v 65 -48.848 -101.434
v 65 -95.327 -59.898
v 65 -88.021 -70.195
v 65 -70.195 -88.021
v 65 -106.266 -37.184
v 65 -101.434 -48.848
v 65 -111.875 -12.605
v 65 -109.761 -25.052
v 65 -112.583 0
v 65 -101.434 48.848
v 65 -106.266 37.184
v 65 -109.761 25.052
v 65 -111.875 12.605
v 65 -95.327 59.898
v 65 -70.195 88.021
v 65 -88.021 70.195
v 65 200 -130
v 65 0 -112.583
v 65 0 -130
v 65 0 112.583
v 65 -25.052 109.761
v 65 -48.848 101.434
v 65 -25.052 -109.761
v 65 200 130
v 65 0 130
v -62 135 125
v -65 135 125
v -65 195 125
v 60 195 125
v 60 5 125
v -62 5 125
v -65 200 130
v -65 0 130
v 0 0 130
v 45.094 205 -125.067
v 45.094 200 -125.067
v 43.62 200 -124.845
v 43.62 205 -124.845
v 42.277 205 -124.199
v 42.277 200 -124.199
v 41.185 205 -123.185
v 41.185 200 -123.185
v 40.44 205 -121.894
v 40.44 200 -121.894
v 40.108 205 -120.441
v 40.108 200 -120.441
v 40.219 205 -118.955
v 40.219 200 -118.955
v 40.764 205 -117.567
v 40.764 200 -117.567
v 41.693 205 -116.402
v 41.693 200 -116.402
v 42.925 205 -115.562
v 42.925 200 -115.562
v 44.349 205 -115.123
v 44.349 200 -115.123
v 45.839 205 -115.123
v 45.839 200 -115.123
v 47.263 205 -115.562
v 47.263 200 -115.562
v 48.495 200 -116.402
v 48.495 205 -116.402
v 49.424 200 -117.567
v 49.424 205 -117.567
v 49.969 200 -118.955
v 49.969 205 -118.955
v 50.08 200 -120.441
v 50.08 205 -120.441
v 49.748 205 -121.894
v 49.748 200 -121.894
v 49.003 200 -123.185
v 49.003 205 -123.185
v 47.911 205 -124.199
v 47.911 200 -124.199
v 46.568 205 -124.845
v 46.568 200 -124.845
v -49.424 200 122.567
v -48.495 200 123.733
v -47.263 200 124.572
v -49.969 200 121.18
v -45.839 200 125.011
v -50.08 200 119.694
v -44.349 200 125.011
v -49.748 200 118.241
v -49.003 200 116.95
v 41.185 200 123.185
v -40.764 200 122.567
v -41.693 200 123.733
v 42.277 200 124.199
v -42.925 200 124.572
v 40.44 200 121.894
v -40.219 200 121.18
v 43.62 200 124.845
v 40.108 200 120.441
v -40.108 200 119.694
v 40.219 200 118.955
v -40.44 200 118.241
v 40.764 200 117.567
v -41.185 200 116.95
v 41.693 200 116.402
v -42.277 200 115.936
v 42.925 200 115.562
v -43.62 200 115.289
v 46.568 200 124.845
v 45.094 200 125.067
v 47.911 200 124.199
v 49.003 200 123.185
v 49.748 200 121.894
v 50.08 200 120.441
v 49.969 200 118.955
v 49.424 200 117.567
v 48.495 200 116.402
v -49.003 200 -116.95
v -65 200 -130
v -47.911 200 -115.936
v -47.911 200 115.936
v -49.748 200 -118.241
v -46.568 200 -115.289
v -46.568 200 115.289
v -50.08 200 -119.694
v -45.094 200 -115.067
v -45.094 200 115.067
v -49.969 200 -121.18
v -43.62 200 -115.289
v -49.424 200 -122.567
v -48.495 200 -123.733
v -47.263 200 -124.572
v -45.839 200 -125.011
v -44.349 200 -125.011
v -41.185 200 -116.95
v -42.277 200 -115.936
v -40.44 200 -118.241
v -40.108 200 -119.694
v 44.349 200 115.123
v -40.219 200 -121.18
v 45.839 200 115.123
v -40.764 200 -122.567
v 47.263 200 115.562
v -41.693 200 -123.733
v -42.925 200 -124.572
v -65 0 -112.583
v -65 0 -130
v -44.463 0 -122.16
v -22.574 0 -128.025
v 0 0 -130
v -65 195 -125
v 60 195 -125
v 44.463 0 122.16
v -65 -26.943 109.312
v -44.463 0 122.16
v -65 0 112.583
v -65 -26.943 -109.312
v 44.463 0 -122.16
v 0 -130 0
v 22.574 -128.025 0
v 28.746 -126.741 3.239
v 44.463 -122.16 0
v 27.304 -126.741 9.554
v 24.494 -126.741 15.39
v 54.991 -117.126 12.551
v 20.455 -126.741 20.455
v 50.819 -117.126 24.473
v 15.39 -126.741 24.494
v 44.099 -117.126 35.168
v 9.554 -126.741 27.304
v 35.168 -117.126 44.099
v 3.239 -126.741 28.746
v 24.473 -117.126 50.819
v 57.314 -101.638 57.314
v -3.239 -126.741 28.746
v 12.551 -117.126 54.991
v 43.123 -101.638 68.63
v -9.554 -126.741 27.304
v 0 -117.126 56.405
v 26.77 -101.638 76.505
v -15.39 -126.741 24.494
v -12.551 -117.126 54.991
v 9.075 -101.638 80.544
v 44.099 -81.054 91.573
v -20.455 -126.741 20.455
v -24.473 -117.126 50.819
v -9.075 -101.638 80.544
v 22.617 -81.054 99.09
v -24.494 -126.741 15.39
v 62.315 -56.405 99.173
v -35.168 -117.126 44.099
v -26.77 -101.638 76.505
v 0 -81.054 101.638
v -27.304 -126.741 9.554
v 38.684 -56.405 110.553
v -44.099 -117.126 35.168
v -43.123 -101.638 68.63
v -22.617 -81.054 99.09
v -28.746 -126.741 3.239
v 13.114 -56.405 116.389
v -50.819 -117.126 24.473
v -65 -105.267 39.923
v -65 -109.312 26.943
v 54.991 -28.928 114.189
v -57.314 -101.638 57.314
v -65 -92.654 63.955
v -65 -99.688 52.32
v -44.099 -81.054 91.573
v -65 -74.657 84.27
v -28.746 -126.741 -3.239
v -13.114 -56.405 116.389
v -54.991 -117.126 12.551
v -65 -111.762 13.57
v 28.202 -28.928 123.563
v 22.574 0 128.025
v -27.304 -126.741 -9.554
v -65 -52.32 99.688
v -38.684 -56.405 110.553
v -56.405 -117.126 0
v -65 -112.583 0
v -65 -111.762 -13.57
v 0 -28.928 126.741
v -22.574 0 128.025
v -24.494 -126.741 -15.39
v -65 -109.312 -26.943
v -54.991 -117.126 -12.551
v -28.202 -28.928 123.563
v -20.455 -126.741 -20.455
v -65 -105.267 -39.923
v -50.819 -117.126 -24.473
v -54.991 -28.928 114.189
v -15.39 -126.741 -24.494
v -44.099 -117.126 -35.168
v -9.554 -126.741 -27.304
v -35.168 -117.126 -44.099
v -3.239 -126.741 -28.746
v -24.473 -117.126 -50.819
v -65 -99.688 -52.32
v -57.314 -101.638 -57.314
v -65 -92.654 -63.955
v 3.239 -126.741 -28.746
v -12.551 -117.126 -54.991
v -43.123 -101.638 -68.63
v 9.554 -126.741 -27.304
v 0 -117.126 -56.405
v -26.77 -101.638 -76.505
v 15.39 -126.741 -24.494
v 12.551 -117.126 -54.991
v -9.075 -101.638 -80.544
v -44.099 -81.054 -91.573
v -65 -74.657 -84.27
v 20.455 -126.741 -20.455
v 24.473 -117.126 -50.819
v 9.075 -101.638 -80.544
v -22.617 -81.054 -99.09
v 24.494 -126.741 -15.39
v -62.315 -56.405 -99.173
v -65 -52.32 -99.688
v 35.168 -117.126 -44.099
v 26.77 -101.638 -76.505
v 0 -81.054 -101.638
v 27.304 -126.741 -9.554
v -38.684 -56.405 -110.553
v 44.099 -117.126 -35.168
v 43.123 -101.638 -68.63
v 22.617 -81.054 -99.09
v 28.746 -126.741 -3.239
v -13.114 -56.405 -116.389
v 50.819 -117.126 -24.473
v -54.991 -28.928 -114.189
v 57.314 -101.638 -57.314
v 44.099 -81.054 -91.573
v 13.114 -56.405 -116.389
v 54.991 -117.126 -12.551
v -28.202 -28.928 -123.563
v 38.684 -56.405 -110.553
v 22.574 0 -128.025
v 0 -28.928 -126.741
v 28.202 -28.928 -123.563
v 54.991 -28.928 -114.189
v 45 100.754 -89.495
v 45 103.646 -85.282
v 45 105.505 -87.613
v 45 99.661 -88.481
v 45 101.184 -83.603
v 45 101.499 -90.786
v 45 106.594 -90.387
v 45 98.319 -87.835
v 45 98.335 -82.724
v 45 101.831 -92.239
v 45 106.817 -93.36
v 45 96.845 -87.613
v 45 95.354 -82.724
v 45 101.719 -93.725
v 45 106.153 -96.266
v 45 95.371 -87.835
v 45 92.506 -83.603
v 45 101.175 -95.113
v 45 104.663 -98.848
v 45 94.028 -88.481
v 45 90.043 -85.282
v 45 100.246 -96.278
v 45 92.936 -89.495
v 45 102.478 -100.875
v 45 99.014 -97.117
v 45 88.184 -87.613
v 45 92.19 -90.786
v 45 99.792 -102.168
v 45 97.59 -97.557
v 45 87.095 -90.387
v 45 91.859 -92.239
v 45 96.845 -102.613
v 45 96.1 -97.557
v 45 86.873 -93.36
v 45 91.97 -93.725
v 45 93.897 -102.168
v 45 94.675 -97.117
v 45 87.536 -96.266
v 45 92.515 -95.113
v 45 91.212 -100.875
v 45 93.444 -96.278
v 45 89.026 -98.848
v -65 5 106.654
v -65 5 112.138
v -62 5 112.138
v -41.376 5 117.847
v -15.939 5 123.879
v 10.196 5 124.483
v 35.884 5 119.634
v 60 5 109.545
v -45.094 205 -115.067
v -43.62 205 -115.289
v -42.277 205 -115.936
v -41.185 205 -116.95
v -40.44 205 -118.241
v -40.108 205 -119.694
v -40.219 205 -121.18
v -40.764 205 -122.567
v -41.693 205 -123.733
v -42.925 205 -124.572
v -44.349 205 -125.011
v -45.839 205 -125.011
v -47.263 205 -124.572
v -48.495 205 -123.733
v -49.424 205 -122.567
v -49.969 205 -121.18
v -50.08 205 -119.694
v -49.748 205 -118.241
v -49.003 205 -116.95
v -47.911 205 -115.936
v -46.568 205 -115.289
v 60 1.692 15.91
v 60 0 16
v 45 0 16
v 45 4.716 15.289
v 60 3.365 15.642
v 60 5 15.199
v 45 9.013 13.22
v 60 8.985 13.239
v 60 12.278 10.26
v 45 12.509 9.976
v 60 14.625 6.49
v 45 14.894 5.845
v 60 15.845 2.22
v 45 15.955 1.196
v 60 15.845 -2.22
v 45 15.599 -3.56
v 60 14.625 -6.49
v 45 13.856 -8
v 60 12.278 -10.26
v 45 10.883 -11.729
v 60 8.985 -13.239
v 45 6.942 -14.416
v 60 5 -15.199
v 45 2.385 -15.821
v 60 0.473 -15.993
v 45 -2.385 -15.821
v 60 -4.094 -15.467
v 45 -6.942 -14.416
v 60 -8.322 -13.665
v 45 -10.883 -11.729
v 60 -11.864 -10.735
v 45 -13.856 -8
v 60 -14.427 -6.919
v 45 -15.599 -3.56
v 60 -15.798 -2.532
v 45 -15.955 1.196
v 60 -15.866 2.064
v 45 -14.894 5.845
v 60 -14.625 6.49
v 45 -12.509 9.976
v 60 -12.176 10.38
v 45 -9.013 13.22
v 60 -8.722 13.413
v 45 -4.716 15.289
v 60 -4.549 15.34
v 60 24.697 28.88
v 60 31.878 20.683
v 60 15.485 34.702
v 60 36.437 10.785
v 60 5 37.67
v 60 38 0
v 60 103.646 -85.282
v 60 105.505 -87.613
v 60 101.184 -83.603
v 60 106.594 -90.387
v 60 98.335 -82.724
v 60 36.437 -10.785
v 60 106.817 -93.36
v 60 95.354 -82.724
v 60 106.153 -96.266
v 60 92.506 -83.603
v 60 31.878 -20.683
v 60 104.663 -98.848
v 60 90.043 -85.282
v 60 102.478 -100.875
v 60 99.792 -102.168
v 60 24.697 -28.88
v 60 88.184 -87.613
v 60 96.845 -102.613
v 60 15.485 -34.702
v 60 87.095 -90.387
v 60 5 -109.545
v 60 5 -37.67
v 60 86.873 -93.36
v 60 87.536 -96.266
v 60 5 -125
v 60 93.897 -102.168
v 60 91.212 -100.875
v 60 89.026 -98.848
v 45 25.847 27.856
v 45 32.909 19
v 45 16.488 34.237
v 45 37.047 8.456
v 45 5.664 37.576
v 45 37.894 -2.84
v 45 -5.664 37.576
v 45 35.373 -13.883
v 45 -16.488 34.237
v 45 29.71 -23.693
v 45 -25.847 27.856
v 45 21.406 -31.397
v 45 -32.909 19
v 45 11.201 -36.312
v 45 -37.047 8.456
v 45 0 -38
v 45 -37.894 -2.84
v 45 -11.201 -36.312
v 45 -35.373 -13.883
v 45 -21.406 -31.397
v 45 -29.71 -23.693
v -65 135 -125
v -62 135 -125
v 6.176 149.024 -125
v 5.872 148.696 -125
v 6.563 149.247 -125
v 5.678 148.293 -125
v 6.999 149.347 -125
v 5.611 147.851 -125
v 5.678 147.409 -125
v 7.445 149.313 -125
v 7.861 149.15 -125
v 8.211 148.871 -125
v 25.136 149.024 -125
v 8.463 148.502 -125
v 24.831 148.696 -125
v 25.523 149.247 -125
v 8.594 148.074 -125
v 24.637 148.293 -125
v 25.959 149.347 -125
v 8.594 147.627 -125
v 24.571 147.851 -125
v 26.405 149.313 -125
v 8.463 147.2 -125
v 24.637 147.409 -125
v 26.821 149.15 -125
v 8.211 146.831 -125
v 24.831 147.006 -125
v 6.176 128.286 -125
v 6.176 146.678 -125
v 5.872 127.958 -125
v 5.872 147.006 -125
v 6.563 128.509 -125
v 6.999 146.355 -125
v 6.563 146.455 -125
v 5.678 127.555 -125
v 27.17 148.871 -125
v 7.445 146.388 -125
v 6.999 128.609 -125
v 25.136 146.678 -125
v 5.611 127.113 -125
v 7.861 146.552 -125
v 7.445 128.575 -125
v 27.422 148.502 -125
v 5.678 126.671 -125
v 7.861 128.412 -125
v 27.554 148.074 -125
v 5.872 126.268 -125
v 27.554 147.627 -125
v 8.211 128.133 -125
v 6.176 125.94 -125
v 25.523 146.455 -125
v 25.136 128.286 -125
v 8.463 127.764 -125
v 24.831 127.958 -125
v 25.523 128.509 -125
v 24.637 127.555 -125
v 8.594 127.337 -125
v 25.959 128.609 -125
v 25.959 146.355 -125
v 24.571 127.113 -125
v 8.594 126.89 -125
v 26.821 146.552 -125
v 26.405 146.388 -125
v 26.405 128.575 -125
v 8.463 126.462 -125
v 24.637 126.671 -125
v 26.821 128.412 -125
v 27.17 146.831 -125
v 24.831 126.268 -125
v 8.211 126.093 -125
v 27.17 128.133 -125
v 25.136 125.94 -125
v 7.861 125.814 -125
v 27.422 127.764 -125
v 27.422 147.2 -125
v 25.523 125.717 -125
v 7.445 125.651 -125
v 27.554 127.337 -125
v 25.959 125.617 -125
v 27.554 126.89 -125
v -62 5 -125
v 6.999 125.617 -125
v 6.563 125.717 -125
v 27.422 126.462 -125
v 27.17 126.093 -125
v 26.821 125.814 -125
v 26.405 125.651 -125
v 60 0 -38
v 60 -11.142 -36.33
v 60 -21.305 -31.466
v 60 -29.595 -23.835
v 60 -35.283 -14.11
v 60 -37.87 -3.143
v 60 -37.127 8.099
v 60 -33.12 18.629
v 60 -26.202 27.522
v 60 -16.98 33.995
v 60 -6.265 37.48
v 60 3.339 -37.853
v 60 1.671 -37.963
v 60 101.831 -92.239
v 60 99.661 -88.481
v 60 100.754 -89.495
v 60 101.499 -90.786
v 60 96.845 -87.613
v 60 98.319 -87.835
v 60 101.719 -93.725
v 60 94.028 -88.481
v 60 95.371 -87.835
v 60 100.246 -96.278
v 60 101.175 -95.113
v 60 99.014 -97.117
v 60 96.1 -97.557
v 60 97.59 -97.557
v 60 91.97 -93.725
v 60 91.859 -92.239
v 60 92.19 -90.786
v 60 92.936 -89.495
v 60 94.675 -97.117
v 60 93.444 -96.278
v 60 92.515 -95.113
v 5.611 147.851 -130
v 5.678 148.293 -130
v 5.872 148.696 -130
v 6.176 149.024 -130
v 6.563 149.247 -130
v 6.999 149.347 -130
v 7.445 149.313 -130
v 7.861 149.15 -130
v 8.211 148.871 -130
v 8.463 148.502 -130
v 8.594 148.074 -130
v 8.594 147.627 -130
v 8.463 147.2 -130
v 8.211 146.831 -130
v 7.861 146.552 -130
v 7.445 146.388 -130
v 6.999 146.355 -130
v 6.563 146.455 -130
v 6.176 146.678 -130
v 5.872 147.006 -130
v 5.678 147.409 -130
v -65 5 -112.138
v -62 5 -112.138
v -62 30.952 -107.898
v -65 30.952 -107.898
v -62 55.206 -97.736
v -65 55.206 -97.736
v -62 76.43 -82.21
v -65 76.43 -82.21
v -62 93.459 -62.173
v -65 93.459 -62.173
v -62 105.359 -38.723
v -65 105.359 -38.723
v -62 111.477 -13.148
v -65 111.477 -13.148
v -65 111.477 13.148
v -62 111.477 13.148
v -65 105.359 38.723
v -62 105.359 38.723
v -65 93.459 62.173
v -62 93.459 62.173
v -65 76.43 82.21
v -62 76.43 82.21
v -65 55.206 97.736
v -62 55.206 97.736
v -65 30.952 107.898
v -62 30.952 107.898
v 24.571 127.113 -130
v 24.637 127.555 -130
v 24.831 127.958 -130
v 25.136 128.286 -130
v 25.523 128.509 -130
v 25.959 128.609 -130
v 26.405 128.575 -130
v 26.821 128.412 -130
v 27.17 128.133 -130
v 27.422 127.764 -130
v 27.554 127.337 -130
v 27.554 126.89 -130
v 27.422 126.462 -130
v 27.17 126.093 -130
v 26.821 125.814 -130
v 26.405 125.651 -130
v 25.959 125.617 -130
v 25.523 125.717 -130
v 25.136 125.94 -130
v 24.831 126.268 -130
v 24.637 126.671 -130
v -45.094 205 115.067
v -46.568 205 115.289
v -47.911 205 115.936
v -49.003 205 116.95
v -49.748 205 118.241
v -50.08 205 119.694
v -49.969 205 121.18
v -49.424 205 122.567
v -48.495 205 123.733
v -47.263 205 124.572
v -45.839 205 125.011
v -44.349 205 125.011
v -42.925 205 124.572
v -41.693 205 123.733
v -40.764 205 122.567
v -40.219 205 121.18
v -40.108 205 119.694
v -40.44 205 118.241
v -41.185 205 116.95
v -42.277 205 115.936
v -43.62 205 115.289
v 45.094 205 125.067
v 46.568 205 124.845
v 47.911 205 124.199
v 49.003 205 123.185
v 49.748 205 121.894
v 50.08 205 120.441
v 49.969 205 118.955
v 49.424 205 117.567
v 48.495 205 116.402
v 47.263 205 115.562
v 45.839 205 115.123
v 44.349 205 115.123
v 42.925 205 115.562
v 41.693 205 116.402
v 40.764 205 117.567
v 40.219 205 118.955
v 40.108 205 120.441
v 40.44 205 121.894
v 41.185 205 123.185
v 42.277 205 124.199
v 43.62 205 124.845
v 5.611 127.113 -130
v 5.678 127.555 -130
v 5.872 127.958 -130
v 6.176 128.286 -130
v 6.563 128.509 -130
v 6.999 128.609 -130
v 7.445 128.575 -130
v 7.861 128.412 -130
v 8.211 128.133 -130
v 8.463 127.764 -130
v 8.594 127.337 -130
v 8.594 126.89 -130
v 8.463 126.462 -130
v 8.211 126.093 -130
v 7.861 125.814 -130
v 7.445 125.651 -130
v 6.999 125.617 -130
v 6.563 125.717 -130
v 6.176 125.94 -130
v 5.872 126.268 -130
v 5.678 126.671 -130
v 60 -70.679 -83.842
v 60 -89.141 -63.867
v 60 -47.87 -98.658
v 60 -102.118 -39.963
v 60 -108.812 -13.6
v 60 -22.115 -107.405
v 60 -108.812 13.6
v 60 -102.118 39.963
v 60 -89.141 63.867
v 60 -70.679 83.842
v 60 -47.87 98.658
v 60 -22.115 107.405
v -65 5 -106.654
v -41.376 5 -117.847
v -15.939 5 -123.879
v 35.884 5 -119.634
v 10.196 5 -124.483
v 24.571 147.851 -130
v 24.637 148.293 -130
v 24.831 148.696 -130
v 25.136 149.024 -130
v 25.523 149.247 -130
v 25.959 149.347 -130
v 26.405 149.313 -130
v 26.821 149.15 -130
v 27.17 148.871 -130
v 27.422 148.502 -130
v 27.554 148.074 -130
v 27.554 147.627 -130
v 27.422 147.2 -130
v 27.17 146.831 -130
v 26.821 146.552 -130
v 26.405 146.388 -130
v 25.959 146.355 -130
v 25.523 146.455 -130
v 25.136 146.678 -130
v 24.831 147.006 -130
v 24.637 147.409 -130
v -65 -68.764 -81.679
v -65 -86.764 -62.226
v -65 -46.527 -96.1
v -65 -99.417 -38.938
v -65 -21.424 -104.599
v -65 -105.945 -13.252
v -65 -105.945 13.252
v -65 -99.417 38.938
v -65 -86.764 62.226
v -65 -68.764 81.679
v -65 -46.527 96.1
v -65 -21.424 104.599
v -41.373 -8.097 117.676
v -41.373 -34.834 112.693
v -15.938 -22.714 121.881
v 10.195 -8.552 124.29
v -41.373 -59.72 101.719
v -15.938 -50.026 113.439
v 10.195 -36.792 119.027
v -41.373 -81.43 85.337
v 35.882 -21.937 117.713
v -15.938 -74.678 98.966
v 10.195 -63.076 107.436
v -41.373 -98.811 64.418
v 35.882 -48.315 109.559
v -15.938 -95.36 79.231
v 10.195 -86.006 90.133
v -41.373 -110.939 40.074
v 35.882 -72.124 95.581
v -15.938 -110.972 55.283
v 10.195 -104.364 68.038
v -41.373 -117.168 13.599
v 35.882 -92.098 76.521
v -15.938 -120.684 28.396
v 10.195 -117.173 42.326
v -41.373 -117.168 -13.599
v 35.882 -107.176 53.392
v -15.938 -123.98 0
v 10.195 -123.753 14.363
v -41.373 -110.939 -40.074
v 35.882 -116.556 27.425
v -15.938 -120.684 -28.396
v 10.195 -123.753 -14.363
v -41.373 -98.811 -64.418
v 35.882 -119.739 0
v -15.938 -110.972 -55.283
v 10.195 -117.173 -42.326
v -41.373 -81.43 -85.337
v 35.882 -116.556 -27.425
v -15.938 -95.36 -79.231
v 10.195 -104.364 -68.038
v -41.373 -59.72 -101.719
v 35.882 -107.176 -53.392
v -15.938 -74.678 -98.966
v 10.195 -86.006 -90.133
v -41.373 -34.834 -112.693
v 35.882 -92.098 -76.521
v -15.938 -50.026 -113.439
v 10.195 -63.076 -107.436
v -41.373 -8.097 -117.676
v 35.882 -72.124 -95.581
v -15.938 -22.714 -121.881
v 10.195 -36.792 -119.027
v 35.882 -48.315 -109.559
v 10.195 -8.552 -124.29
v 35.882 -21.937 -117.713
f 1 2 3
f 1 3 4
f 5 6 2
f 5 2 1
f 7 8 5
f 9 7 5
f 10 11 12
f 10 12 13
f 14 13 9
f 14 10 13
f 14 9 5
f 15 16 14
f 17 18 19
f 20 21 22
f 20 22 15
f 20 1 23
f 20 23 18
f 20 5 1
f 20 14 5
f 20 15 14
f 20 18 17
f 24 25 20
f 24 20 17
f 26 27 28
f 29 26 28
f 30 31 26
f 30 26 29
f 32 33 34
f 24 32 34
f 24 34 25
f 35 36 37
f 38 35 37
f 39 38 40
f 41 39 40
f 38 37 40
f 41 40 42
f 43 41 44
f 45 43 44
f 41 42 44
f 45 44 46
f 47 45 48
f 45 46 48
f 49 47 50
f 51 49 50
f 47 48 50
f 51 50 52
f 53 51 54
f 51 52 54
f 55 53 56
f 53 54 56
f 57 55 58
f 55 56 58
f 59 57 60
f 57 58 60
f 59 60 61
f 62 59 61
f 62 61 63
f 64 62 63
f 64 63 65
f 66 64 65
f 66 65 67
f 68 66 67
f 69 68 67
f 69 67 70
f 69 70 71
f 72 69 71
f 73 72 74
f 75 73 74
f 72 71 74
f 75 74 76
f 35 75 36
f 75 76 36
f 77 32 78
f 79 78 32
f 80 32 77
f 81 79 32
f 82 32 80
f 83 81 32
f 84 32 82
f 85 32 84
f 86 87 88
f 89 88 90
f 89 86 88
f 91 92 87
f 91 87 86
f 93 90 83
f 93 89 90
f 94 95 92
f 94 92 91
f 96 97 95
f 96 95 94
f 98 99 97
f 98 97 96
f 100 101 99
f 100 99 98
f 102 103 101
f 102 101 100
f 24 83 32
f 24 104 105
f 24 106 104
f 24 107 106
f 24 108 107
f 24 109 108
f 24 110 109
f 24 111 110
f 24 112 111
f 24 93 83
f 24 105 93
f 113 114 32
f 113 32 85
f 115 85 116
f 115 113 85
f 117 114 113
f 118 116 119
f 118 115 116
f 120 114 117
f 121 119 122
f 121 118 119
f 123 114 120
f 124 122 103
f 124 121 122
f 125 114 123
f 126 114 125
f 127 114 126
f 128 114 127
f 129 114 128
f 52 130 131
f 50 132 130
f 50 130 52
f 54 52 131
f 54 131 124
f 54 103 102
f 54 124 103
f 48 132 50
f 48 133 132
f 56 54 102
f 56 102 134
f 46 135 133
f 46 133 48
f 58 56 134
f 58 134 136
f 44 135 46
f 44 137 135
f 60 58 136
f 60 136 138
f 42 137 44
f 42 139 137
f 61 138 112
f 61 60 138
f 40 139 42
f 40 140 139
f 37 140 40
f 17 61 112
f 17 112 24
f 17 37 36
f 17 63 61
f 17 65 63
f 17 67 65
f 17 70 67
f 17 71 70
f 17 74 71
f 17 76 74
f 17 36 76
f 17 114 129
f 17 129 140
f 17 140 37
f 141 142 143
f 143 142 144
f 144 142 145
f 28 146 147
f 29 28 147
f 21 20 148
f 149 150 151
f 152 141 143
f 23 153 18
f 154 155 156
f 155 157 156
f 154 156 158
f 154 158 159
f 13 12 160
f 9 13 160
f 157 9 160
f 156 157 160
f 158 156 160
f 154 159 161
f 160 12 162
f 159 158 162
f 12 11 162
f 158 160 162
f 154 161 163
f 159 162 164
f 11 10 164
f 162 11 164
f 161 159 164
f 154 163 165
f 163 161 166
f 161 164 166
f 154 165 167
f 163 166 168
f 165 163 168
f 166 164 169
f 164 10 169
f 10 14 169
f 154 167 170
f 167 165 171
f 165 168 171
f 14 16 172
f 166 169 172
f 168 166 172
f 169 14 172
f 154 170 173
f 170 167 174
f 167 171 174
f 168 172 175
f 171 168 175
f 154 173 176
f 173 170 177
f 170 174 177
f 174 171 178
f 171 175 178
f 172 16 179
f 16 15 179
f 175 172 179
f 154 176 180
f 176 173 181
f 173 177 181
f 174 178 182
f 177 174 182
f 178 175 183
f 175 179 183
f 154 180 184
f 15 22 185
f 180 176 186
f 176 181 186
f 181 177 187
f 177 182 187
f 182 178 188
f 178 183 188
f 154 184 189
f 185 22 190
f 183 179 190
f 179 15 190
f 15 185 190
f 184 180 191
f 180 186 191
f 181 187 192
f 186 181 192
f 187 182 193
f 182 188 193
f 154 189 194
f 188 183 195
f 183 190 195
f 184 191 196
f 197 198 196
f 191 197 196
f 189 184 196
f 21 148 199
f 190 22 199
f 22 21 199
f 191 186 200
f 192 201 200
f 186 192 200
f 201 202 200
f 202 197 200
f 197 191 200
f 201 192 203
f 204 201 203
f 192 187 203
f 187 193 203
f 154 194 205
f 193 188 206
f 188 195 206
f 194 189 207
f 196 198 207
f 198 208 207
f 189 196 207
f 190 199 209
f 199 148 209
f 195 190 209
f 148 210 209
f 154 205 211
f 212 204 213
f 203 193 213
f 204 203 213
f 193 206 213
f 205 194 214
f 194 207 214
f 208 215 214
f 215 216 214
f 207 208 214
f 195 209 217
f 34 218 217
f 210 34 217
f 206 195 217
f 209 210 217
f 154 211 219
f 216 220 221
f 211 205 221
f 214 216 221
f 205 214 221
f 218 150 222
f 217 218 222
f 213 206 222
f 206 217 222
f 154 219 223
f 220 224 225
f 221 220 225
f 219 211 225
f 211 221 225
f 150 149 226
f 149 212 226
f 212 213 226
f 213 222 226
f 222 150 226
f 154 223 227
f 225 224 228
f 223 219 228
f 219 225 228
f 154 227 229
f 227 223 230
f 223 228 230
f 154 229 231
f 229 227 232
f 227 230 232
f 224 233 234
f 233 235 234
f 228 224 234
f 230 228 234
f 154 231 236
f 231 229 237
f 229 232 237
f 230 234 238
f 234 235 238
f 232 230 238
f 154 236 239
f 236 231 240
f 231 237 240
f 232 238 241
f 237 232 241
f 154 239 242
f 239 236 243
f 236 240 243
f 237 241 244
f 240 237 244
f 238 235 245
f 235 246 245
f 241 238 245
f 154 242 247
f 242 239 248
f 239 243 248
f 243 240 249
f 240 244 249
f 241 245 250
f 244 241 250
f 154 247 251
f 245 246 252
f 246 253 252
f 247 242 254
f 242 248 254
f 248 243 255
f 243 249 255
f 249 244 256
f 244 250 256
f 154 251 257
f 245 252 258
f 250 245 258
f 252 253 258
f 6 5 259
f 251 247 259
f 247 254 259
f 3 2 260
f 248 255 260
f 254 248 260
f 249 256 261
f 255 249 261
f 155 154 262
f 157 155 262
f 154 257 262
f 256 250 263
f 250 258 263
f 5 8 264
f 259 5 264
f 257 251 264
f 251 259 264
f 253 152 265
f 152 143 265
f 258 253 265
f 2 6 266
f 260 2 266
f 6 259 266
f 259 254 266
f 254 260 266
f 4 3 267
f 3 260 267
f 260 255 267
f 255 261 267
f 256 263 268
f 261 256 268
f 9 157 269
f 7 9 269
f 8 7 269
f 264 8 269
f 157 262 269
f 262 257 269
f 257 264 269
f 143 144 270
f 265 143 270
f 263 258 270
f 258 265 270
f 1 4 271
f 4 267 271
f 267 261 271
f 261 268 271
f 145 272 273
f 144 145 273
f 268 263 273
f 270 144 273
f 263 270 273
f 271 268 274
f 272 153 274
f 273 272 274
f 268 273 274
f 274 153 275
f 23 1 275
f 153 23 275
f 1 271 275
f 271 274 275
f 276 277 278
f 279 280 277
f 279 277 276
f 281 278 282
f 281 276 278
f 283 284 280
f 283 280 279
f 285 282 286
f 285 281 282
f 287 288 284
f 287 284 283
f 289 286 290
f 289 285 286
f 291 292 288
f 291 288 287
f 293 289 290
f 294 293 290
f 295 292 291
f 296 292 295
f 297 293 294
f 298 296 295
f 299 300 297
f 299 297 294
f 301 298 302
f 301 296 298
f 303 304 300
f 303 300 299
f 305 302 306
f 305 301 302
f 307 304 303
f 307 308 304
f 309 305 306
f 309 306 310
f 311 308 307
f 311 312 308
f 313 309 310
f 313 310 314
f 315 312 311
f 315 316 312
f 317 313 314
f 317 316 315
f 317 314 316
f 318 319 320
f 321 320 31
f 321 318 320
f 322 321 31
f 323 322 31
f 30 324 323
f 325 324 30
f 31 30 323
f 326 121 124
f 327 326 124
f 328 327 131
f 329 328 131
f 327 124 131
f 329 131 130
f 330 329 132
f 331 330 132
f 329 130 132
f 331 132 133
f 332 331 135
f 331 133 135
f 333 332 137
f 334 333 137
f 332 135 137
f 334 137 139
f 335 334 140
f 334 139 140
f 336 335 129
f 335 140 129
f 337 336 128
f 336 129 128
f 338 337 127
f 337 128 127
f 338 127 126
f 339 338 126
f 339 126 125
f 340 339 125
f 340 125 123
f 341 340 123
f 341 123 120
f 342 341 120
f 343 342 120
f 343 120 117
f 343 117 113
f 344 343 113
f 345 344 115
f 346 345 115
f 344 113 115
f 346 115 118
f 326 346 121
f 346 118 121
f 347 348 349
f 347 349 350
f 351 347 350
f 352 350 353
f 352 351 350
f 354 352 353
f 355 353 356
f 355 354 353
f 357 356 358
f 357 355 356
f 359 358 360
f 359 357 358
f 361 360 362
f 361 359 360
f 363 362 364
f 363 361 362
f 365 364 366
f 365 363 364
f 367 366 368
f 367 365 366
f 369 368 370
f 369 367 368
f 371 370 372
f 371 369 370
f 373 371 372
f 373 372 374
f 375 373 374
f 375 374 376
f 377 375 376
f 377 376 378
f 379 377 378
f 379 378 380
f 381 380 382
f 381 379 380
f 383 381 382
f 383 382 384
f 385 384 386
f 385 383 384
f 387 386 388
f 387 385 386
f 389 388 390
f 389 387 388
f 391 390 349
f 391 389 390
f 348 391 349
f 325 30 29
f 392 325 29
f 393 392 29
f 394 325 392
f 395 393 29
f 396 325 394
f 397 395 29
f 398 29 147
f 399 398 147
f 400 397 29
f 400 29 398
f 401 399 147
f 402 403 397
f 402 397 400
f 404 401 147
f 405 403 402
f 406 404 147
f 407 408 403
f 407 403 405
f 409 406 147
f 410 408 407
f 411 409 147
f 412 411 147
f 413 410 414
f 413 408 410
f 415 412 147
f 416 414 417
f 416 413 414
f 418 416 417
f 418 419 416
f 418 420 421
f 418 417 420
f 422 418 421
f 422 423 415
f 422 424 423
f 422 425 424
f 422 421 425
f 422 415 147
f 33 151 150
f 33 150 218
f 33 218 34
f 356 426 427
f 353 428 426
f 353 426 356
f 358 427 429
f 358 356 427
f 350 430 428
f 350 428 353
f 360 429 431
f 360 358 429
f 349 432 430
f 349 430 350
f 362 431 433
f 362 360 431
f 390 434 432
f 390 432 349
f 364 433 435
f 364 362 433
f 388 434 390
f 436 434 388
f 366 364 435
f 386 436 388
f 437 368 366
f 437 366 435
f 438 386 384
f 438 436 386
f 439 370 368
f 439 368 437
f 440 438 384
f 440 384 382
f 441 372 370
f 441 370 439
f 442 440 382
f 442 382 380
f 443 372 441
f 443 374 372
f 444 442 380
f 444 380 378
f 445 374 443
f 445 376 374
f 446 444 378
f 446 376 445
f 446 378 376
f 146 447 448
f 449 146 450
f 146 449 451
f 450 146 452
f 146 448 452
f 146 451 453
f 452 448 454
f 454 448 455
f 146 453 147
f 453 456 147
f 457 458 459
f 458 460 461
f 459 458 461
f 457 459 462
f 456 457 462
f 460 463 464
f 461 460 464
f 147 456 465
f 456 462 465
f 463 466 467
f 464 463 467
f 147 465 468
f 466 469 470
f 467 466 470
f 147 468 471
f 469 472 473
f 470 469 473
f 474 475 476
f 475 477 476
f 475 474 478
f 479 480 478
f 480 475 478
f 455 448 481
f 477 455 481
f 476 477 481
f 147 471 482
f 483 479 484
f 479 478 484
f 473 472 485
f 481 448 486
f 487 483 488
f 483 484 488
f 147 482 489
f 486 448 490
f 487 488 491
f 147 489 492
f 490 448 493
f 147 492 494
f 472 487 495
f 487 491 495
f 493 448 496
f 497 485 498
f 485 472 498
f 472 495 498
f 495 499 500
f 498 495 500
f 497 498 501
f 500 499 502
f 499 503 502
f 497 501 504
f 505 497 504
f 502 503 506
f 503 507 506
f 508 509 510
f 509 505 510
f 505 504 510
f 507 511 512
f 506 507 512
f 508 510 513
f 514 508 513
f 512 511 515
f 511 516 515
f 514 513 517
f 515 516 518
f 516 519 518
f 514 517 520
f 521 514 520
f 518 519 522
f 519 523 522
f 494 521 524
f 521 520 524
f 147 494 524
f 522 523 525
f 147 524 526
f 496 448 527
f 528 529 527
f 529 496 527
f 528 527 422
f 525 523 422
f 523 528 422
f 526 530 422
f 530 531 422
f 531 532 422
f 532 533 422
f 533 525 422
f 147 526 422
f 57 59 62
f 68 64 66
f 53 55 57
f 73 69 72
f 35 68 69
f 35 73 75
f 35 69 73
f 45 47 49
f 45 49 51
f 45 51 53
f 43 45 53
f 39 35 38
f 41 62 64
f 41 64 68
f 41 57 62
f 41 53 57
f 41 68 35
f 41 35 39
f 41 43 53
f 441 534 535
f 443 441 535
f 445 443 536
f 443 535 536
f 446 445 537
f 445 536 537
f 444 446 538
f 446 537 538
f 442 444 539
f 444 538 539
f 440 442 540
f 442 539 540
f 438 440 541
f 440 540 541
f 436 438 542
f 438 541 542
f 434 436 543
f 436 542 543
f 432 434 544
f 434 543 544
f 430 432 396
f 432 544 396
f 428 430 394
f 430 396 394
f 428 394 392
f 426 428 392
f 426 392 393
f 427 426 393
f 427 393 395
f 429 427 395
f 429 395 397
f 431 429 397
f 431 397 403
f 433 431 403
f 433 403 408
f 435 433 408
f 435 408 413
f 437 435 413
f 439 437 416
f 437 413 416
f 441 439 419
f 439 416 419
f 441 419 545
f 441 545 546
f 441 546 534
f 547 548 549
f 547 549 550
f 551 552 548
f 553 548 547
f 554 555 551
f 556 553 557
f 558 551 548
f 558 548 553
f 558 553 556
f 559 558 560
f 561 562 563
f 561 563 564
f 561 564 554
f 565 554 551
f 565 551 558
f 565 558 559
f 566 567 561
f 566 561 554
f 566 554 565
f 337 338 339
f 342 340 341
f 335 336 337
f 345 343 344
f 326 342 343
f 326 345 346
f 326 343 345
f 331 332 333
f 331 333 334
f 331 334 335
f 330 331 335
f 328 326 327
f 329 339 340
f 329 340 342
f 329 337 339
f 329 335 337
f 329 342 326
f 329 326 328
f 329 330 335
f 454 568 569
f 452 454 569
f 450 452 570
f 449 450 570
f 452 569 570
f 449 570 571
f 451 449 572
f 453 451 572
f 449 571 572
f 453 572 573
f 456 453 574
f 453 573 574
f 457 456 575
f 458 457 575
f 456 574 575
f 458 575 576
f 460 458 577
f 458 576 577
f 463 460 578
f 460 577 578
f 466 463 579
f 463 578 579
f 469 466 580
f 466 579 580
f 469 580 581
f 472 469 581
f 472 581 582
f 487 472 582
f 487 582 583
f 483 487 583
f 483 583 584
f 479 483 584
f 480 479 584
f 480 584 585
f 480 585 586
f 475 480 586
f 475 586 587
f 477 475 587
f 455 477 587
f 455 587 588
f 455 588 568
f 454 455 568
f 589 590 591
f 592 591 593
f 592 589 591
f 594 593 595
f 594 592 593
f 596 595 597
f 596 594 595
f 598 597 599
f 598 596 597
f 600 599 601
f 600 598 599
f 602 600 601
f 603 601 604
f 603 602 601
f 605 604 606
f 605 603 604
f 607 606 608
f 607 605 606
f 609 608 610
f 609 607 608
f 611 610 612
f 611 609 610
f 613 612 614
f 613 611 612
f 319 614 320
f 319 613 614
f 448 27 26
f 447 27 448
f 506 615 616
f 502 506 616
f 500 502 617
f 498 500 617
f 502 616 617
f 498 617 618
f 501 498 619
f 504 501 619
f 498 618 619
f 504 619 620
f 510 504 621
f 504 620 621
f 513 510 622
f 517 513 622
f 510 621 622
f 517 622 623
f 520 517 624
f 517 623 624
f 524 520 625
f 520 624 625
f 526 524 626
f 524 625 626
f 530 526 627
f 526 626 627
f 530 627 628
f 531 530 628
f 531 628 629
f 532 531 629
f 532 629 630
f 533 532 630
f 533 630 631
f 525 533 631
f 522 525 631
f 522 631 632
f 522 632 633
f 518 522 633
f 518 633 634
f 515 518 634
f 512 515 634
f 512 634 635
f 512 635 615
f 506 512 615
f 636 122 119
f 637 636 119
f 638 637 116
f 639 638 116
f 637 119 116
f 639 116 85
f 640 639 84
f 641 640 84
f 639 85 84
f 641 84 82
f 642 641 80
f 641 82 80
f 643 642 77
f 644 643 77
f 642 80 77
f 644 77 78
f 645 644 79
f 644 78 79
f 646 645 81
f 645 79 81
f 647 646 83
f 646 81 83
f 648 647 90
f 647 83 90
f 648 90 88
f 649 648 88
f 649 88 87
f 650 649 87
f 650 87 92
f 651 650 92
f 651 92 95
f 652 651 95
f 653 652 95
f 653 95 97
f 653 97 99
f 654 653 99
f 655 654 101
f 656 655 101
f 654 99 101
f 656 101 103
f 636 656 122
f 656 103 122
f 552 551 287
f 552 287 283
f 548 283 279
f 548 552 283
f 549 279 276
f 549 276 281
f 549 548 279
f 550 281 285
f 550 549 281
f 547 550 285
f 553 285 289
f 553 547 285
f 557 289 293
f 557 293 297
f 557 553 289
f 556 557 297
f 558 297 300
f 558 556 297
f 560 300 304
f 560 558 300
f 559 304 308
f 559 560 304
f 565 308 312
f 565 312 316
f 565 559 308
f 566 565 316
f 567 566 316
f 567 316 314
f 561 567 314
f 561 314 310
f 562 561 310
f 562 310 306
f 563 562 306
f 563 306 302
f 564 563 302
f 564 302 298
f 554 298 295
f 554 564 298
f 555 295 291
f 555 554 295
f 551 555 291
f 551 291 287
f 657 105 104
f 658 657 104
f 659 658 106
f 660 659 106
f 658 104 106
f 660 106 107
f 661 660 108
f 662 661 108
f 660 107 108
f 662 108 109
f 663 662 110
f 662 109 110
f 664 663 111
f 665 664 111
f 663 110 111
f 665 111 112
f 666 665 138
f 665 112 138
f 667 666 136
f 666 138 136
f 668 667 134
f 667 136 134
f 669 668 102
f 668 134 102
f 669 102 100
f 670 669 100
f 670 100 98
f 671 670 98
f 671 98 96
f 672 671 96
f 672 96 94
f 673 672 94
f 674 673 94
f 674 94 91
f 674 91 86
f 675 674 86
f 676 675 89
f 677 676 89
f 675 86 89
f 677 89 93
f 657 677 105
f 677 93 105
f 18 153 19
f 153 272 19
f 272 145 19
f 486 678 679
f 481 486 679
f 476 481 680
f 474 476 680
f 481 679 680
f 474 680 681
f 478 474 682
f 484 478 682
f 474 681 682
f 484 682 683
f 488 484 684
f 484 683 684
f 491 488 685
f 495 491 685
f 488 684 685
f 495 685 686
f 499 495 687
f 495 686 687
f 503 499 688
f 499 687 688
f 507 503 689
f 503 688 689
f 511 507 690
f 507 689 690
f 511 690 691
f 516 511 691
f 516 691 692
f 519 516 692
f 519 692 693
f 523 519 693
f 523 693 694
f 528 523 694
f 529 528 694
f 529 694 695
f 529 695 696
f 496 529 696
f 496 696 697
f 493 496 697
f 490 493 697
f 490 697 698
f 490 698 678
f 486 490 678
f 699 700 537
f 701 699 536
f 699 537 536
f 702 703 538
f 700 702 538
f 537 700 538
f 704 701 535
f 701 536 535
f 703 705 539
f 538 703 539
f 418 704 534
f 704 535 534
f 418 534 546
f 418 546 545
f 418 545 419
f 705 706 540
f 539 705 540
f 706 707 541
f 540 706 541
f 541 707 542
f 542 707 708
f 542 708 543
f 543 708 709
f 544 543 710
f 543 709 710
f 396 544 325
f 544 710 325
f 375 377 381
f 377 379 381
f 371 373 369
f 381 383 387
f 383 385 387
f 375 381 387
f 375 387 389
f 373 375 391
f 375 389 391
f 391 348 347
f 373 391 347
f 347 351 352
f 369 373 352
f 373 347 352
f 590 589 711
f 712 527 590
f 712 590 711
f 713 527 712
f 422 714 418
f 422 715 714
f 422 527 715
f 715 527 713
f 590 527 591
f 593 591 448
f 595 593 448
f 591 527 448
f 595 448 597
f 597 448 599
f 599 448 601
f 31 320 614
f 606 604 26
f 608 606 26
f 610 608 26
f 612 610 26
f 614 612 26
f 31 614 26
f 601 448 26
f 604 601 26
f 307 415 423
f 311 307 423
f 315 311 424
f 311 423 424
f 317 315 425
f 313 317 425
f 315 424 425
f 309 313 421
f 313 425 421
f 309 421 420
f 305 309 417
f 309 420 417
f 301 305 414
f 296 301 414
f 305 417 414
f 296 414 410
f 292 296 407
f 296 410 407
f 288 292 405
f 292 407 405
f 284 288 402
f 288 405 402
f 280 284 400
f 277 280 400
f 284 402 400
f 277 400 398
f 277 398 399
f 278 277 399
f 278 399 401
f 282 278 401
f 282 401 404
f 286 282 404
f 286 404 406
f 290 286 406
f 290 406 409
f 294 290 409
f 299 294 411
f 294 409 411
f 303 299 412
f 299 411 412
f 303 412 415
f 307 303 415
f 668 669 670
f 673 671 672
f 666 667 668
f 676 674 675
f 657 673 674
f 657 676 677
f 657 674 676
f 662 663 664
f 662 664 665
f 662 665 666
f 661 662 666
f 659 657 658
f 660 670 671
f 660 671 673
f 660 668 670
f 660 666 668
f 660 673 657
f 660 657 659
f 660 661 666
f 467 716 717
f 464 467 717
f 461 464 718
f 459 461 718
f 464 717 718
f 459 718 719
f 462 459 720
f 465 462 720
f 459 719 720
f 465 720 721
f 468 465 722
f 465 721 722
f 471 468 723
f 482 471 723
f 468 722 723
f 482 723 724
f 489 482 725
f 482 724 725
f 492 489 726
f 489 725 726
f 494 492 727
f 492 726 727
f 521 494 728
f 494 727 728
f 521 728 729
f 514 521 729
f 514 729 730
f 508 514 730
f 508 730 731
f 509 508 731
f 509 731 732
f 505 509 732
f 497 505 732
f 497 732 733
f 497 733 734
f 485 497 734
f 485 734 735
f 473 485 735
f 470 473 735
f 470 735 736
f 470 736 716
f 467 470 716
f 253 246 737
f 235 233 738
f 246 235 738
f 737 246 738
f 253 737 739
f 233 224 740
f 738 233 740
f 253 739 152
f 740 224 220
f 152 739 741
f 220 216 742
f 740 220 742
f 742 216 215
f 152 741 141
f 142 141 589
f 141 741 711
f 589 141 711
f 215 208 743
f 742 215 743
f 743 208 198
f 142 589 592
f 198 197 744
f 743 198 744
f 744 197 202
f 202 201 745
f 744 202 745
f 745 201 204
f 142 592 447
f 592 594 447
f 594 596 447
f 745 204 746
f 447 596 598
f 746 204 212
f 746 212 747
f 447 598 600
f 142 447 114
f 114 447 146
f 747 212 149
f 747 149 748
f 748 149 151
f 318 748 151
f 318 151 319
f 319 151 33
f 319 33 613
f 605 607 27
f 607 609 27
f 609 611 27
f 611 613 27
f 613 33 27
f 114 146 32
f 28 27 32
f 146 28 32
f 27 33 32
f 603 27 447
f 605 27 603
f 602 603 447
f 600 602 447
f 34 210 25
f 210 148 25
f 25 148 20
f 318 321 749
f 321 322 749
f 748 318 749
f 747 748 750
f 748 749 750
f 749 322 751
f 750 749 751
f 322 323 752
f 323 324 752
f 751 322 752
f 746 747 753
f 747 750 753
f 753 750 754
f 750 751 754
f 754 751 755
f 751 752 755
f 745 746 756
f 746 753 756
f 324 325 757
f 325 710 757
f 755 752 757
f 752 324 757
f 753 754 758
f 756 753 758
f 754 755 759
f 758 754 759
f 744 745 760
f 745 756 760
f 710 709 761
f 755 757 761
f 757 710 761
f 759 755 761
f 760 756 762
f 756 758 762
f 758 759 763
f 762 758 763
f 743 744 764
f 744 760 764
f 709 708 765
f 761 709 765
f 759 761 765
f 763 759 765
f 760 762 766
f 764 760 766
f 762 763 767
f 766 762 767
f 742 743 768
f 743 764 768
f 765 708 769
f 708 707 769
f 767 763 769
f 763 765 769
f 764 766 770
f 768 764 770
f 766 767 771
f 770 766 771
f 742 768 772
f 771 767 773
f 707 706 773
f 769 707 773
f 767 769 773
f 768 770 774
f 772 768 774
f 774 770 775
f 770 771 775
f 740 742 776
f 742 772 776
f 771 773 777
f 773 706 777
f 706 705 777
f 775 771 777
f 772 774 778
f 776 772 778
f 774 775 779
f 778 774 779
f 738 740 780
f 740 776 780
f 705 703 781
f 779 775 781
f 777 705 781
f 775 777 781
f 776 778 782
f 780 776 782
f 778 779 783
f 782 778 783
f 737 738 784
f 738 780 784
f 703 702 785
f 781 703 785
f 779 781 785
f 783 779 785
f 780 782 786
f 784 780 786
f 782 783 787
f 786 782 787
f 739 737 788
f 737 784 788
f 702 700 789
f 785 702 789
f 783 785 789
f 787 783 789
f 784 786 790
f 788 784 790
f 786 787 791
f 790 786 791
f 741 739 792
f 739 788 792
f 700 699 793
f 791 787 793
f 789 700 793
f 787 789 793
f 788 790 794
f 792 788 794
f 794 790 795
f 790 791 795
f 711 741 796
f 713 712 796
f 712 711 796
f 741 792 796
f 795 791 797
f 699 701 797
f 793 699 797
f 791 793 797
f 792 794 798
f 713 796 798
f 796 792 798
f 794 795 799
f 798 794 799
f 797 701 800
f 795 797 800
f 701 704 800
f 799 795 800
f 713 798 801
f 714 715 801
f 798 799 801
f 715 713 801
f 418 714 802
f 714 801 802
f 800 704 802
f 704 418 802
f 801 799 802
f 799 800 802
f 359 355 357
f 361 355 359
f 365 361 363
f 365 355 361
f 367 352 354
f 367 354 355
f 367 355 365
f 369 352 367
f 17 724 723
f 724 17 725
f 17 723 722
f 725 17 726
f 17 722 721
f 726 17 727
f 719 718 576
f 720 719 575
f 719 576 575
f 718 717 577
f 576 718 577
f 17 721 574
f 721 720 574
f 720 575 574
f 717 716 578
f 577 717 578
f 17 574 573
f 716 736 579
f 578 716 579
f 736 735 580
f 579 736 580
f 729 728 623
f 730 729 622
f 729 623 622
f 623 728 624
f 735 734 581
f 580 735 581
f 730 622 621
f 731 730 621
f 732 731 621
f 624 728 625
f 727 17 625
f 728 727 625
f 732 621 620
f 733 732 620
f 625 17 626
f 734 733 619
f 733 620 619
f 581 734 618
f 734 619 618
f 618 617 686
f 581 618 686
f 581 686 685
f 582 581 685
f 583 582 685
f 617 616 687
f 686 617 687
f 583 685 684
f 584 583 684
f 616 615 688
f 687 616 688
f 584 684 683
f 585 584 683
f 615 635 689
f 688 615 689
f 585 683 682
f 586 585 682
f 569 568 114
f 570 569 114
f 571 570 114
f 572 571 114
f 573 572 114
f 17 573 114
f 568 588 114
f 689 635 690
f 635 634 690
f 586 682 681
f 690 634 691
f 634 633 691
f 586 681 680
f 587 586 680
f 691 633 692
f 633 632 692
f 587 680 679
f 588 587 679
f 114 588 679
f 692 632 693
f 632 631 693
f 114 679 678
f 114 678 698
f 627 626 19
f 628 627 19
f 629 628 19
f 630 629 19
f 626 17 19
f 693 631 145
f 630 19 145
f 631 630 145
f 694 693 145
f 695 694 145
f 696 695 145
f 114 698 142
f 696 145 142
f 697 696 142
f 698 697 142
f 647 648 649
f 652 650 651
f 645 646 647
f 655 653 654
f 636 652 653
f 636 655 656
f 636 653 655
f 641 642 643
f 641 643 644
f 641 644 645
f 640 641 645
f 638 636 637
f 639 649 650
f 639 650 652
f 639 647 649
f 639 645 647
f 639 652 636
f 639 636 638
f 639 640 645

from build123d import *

# Parameters (mm, degrees)
EXTRUDE_1_DEPTH           = 200
CUT_EXTRUDE_START         = -130
CUT_EXTRUDE_1_OUTLINE_W   = 315
CUT_EXTRUDE_1_OUTLINE_H   = 262
CUT_EXTRUDE_1_DEPTH       = 65
CUT_EXTRUDE_START_2       = 65
CUT_EXTRUDE_1_2_OUTLINE_W = 315
CUT_EXTRUDE_1_2_OUTLINE_H = 262
CUT_EXTRUDE_1_2_DEPTH     = 65
SHELL_START               = 5
SHELL_1_OUTLINE_W         = 125
SHELL_1_OUTLINE_H         = 250
SHELL_1_DEPTH             = 190
EXTRUDE_7_DEPTH           = 3
SKETCH_5_R                = 5
EXTRUDE_8_DEPTH           = 5
SKETCH_6_R                = 38
SKETCH_6_R_2              = 16
EXTRUDE_9_DEPTH           = 15
SKETCH_7_R                = 10
SKETCH_7_R_2              = 5
EXTRUDE_10_DEPTH          = 15
SKETCH_8_R                = 1.5
CUT_EXTRUDE_2_DEPTH       = 10


with BuildPart() as part:
    # 草图1 → 旋转1 (revolve)
    with BuildSketch(Plane.XY):
        with BuildLine():
            Line((0, 130), (0, -130))
            ThreePointArc((0, -130), (130, 0), (0, 130))
        make_face()
    revolve(axis=Axis((0, 130, 0), (0, -1, 0)))

    # 草图3 → 凸台-拉伸1 (add)
    with BuildSketch(Plane(origin=(0, 0, 0), x_dir=(1, 0, 0), z_dir=(0, 1, 0))):
        with BuildLine():
            Line((-120, -130), (120, -130))
            ThreePointArc((120, -130), (127.071067812, -127.071067812), (130, -120))
            Line((130, -120), (130, 120))
            ThreePointArc((130, 120), (127.071067812, 127.071067812), (120, 130))
            Line((120, 130), (-120, 130))
            ThreePointArc((-120, 130), (-127.071067812, 127.071067812), (-130, 120))
            Line((-130, 120), (-130, -120))
            ThreePointArc((-130, -120), (-127.071067812, -127.071067812), (-120, -130))
        make_face()
    extrude(amount=EXTRUDE_1_DEPTH)

    # 切除-拉伸1: read off the stored shape, not the designer's step
    # 切除-拉伸1 outline → 切除-拉伸1 (cut)
    with BuildSketch(Plane.YZ.offset(CUT_EXTRUDE_START)):
        with Locations((43.5, 0)):
            Rectangle(CUT_EXTRUDE_1_OUTLINE_W, CUT_EXTRUDE_1_OUTLINE_H)
    extrude(amount=CUT_EXTRUDE_1_DEPTH, mode=Mode.SUBTRACT)

    # Cut-Extrude 1 2 outline → Cut-Extrude 1 2 (cut)
    with BuildSketch(Plane.YZ.offset(CUT_EXTRUDE_START_2)):
        with Locations((43.5, 0)):
            Rectangle(CUT_EXTRUDE_1_2_OUTLINE_W, CUT_EXTRUDE_1_2_OUTLINE_H)
    extrude(amount=CUT_EXTRUDE_1_2_DEPTH, mode=Mode.SUBTRACT)

    # 抽壳1: read off the stored shape, not the designer's step
    # 抽壳1 outline → 抽壳1 (cut)
    with BuildSketch(Plane(origin=(0, 0, 0), x_dir=(1, 0, 0), z_dir=(0, 1, 0)).offset(SHELL_START)):
        with Locations((-2.5, 0)):
            Rectangle(SHELL_1_OUTLINE_W, SHELL_1_OUTLINE_H)
    extrude(amount=SHELL_1_DEPTH, mode=Mode.SUBTRACT)

    # Shell 1 2 outline → Shell 1 2 (revolve, cut)
    with BuildSketch(Plane.YX):
        with BuildLine():
            Line((109.658560943, 60.0000001), (0, 60.000000075))
            Line((0, 60.000000075), (0, -65.0000001))
            Line((0, -65.0000001), (106.770782459, -65.0000001))
            ThreePointArc((106.770782459, -65.0000001), (124.966656288, -2.887008165), (109.658560943, 60.0000001))
        make_face()
    revolve(axis=Axis((0, 0, 0), (1, 0, 0)), mode=Mode.SUBTRACT)

    # 草图4 → 凸台-拉伸7 (add)
    with BuildSketch(Plane.ZY.offset(65)):
        with BuildLine():
            Line((-130, 135), (-130, 0))
            Line((-130, 0), (-112.249721603, 0))
            ThreePointArc((-112.249721603, 0), (0, 112.249721603), (112.249721603, 0))
            Line((112.249721603, 0), (130, 0))
            Line((130, 0), (130, 135))
            Line((130, 135), (-130, 135))
        make_face()
    extrude(amount=-EXTRUDE_7_DEPTH)

    # 草图5 → 凸台-拉伸8 (add)
    with BuildSketch(Plane(origin=(0, 200, 0), x_dir=(1, 0, 0), z_dir=(0, 1, 0))):
        with Locations(Location((-45.093986565, 120.067321952, 0), (0, 0, 270))):
            Circle(SKETCH_5_R)
        with Locations(Location((-45.093986565, -120.067321952, 0), (0, 0, 90))):
            Circle(SKETCH_5_R)
        with Locations(Location((45.093986565, -120.067321952, 0), (0, 0, 270))):
            Circle(SKETCH_5_R)
        with Locations(Location((45.093986565, 120.067321952, 0), (0, 0, 90))):
            Circle(SKETCH_5_R)
    extrude(amount=EXTRUDE_8_DEPTH)

    # 草图6 → 凸台-拉伸9 (add)
    with BuildSketch(Plane.ZY.offset(-60)):
        with Locations(Location((0, 0, 0), (0, 0, 180))):
            Circle(SKETCH_6_R)
        Circle(SKETCH_6_R_2, mode=Mode.SUBTRACT)
    extrude(amount=EXTRUDE_9_DEPTH)

    # 草图7 → 凸台-拉伸10 (add)
    with BuildSketch(Plane.ZY.offset(-60)):
        with Locations(Location((-92.612625974, 96.844728871, 0), (0, 0, 180))):
            Circle(SKETCH_7_R)
        with Locations((-92.612625974, 96.844728871)):
            Circle(SKETCH_7_R_2, mode=Mode.SUBTRACT)
    extrude(amount=EXTRUDE_10_DEPTH)

    # 草图8 → 切除-拉伸2 (cut)
    with BuildSketch(Plane(origin=(0, 0, -130), x_dir=(-1, 0, 0), z_dir=(0, 0, -1))):
        with Locations((-26.070809392, 147.850864108)):
            Circle(SKETCH_8_R)
        with Locations((-7.111216047, 147.850864108)):
            Circle(SKETCH_8_R)
        with Locations((-26.070809392, 127.113089979)):
            Circle(SKETCH_8_R)
        with Locations((-7.111216047, 127.113089979)):
            Circle(SKETCH_8_R)
    extrude(amount=-CUT_EXTRUDE_2_DEPTH, mode=Mode.SUBTRACT)


solid = part.part
